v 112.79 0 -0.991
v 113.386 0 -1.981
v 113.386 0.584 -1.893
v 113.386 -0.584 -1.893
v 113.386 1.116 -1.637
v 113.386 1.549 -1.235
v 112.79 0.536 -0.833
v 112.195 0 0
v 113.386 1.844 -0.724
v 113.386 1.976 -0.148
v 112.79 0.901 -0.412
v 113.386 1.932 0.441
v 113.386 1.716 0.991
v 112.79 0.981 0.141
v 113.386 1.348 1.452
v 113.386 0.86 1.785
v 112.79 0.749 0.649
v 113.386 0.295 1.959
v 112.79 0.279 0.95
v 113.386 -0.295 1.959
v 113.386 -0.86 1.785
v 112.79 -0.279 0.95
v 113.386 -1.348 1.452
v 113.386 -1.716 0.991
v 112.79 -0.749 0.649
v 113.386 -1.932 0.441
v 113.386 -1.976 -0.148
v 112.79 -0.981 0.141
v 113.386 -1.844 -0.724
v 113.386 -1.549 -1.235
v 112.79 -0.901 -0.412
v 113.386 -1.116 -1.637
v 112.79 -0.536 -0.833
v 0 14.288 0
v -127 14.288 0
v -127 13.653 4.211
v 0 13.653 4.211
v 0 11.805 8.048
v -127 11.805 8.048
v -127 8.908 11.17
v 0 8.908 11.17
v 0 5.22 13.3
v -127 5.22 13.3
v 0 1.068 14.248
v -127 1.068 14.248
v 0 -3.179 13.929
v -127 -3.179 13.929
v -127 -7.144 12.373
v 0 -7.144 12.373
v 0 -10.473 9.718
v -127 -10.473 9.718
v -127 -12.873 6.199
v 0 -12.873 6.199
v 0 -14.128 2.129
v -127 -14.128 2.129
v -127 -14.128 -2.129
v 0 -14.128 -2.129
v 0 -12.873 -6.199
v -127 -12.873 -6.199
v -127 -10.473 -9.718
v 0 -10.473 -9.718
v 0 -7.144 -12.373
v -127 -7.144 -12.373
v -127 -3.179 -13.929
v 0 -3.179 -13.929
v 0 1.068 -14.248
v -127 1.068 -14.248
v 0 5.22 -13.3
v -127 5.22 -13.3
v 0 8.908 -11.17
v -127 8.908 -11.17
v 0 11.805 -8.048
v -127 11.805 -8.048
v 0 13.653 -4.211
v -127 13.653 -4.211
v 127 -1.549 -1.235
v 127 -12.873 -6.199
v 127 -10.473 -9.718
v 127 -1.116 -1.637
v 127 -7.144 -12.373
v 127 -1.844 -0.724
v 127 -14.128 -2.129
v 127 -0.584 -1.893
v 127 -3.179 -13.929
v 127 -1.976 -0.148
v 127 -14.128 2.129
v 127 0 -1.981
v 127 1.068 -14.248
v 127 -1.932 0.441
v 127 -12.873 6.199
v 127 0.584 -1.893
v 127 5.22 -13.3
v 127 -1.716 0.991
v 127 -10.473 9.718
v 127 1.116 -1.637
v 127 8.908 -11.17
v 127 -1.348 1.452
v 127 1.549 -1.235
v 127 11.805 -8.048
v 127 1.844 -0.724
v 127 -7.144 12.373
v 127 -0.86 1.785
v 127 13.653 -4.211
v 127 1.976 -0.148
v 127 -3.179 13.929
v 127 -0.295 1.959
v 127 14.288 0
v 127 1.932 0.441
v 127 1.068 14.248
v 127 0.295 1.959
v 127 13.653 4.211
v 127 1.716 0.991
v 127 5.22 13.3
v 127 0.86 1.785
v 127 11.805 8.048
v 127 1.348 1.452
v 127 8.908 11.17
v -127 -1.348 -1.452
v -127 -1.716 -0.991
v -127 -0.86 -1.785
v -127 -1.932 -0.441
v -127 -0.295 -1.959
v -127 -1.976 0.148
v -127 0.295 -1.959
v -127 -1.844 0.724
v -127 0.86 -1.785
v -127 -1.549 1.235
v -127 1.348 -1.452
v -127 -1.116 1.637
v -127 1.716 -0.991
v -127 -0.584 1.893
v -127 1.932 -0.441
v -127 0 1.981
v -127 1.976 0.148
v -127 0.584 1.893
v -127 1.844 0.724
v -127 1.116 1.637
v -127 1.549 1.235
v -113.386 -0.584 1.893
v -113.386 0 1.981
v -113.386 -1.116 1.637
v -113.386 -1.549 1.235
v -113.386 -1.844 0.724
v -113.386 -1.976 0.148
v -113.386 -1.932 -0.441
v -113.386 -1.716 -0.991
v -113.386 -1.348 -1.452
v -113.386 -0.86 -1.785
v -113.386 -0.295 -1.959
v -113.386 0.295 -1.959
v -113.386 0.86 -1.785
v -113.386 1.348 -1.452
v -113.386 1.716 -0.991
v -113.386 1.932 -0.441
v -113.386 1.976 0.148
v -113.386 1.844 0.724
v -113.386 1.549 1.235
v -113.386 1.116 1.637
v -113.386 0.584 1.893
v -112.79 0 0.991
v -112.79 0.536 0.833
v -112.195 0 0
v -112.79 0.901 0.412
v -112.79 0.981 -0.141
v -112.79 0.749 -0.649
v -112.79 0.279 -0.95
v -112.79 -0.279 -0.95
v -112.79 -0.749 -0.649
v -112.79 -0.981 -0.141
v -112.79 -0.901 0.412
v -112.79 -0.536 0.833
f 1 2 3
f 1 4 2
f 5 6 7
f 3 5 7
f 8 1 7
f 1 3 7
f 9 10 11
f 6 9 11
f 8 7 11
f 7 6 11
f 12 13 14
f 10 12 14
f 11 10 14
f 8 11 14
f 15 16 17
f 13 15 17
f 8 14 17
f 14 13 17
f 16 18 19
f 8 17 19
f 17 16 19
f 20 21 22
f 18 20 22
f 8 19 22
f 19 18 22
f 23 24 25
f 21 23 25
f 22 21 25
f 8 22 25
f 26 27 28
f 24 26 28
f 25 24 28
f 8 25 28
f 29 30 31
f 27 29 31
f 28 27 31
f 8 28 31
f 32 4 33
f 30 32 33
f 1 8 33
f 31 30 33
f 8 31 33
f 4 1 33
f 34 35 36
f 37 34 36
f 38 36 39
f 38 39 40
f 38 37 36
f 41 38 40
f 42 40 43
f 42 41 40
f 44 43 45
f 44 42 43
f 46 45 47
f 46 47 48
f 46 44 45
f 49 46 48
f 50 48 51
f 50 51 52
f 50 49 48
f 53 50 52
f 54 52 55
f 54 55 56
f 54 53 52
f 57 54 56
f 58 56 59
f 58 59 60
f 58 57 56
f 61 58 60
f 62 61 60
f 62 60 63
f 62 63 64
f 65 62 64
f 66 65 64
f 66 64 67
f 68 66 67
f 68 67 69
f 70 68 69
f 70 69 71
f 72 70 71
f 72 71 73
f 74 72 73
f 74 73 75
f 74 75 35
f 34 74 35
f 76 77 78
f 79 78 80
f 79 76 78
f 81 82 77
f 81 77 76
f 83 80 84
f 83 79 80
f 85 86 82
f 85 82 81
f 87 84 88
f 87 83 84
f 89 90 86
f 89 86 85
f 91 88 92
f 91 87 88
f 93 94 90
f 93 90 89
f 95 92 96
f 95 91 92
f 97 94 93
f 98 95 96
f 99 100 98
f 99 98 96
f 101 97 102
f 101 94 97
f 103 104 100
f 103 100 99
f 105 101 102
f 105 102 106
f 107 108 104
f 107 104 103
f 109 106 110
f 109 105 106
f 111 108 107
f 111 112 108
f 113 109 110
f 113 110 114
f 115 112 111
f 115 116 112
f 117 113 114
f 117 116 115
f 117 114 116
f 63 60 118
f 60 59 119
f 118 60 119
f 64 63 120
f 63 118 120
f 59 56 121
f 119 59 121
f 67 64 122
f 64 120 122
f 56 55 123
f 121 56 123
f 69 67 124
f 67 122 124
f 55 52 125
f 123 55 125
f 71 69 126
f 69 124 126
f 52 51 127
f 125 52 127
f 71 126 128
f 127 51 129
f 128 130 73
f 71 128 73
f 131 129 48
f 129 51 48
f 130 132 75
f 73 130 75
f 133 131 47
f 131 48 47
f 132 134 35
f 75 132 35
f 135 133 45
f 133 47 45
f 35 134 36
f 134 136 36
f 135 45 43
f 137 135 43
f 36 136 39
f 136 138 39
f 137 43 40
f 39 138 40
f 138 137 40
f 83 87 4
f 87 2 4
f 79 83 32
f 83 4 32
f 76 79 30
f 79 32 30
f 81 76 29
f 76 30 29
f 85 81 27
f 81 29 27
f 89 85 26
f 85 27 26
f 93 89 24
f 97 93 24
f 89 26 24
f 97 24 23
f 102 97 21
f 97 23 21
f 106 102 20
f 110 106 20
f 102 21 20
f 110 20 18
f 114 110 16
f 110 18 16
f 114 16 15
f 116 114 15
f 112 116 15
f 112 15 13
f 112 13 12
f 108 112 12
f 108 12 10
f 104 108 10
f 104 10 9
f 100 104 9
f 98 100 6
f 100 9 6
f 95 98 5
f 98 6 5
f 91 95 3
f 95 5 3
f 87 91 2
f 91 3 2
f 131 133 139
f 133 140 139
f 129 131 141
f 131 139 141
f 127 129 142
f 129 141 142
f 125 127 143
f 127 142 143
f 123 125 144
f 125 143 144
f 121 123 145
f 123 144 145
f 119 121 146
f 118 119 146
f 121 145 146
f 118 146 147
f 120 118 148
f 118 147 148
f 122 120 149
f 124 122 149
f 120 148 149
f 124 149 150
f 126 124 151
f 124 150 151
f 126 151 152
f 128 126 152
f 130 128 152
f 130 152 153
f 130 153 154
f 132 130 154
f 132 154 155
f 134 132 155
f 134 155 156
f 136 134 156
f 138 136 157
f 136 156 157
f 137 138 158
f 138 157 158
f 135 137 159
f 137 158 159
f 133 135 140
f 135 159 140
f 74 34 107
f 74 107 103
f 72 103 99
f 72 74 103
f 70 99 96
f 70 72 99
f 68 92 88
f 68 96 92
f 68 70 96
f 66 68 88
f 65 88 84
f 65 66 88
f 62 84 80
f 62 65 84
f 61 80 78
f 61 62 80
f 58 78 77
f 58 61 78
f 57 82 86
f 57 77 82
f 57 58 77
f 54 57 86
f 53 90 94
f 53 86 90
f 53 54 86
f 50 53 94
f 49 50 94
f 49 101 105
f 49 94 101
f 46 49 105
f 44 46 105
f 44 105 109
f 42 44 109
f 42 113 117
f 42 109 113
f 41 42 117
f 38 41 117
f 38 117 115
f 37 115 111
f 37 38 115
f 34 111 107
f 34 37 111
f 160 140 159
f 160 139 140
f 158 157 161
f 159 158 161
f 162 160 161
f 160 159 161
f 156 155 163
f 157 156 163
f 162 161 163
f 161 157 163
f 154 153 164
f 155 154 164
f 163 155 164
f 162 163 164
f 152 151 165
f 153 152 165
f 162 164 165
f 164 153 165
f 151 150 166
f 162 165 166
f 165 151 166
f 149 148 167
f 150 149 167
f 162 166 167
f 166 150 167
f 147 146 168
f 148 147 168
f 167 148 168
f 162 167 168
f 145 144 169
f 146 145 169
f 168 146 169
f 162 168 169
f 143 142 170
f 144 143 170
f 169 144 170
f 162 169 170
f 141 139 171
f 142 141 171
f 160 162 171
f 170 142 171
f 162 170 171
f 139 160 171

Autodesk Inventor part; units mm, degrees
ref_plane "YZ Plane" through (0, 0, 0) normal (1, 0, 0) x (0, 1, 0)
ref_plane "XZ Plane" through (0, 0, 0) normal (0, 1, 0) x (-1, 0, 0)
ref_plane "XY Plane" through (0, 0, 0) normal (0, 0, 1) x (1, 0, 0)
sketch "Sketch1" plane through (0, 0, 0) normal (0, 0, 1) x (1, 0, 0)
  point P0 (0, 0)
sketch "Sketch2" plane through (0, 0, 0) normal (1, 0, 0) x (0, 1, 0)
  circle A0 centre (0, 0) radius 14.2875
  dimension "d0" = 28.575
extrude "Extrusion1" add sketch "Sketch2" along normal mid plane 254
sketch "Sketch3" plane through (127, 0, 0) normal (1, 0, 0) x (0, 0, -1)
  point P0 (0, 0)
  point P1 (0, 0)
sketch "Sketch4" plane through (-127, 0, 0) normal (-1, 0, 0) x (0, 0, 1)
  point P0 (0, 0)
  point P1 (0, 0)
hole "Hole1" at (127, 0, 0) direction (-1, 0, 0) diameter 3.9624 depth 13.6144 tip angle 118 thread size "10-32 UNF" class "2B" standard "ANSI Unified Screw Threads"
hole "Hole2" at (-127, 0, 0) direction (1, 0, 0) diameter 3.9624 depth 13.6144 tip angle 118 thread size "10-32 UNF" class "2B" standard "ANSI Unified Screw Threads"
properties part number "CL2-002" material "Aluminum 6061"
